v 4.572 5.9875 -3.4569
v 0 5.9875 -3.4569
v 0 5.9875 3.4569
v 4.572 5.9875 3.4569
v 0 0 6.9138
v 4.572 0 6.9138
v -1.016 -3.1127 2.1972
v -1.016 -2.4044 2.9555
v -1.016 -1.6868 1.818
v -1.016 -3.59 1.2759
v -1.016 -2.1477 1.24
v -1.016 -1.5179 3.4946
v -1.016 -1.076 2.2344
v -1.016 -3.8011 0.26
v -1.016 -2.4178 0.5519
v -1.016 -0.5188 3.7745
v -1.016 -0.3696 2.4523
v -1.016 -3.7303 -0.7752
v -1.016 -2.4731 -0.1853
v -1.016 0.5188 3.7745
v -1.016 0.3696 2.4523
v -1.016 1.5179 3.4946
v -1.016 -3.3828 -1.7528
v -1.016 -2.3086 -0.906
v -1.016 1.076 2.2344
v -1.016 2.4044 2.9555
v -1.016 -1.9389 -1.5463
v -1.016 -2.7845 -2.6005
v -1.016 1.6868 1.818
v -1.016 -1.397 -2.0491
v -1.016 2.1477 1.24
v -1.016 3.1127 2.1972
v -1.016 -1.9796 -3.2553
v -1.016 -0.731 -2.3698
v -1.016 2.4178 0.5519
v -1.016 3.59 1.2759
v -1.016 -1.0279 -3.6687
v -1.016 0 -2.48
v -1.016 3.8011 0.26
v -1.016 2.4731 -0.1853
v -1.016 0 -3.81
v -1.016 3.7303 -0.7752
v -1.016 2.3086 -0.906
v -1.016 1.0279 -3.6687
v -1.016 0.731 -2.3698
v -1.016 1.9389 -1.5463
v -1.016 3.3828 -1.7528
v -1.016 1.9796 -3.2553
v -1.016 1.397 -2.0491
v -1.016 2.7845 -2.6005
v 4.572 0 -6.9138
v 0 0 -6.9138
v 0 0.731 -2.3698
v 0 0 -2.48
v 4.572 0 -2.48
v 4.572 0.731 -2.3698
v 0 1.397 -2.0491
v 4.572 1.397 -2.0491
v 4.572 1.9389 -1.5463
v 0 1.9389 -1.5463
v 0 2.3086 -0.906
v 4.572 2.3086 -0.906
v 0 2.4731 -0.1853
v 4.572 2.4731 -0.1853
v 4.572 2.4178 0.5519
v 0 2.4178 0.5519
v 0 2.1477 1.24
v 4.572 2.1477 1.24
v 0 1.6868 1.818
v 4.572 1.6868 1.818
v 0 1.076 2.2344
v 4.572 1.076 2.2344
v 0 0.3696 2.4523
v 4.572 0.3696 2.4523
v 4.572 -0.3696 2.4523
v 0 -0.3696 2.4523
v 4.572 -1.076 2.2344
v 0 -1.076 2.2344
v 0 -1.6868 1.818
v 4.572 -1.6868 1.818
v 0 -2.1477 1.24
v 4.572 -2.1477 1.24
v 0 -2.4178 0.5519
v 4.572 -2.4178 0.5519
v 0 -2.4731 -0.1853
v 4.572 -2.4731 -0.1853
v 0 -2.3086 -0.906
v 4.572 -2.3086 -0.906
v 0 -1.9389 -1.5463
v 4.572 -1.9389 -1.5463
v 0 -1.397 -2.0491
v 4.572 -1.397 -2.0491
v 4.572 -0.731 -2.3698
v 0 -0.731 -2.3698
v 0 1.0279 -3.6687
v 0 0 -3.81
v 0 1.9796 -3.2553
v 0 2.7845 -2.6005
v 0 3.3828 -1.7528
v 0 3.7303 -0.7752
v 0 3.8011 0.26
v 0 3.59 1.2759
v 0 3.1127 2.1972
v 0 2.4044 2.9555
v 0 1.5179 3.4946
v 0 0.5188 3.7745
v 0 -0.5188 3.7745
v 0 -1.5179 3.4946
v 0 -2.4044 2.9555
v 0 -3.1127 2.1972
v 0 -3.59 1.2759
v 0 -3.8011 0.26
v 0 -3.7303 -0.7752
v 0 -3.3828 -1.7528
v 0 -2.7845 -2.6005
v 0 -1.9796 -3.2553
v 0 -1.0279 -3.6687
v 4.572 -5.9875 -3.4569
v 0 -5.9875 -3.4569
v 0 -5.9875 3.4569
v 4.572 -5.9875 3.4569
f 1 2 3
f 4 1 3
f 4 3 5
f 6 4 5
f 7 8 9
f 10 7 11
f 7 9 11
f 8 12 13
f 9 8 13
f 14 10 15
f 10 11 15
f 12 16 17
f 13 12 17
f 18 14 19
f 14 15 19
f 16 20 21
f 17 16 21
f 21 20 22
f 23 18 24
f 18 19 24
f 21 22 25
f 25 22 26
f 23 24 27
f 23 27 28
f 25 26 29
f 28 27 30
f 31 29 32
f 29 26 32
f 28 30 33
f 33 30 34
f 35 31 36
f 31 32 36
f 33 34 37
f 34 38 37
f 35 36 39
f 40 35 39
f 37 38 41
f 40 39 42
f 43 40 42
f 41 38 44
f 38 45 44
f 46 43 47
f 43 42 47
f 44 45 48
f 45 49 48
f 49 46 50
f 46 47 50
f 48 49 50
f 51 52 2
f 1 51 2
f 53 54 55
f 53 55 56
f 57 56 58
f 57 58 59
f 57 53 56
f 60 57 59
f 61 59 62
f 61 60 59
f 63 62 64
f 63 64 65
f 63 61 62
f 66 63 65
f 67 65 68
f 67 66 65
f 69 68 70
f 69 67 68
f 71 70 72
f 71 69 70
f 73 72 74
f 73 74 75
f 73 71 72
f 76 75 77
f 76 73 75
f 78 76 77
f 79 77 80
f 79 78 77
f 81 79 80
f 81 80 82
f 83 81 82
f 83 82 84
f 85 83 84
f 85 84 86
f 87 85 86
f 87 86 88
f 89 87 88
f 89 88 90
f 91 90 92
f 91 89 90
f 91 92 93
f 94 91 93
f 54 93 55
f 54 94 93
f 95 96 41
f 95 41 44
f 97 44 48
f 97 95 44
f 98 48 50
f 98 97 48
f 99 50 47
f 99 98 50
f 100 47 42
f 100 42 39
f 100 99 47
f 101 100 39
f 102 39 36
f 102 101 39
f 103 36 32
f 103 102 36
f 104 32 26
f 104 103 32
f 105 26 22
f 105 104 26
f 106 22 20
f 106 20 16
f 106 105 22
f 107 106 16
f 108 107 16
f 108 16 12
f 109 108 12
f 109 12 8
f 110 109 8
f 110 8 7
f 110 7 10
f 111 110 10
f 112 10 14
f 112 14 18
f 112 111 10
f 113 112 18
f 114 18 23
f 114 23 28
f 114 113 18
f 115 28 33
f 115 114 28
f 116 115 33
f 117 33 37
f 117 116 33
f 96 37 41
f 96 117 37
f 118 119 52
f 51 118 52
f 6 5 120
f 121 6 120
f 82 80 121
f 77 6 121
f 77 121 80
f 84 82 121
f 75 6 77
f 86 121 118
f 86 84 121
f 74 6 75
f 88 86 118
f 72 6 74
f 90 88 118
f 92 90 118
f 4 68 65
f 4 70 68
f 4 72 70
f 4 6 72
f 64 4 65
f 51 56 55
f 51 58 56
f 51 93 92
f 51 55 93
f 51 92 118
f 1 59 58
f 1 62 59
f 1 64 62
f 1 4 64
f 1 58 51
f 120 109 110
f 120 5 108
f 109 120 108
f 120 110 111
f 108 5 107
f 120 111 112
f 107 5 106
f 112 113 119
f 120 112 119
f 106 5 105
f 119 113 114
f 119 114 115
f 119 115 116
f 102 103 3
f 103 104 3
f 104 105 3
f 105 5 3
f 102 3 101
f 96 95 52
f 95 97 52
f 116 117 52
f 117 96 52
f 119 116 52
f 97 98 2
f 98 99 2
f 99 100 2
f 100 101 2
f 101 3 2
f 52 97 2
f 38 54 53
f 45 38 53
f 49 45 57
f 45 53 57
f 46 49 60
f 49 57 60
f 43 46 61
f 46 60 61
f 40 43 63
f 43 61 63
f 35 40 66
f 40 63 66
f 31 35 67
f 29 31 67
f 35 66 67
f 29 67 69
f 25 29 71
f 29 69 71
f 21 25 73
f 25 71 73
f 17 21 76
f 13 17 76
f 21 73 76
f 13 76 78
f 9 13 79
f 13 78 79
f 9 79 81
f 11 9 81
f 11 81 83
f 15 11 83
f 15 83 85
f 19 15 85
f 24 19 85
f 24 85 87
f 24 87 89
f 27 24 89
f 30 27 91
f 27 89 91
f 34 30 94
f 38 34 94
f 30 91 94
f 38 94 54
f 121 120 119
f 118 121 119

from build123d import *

# Parameters (mm, degrees)
SKETCH1_R           = 2.48
BOSS_EXTRUDE1_DEPTH = 4.572
SKETCH2_R           = 3.81
SKETCH2_R_2         = 2.48
BOSS_EXTRUDE2_DEPTH = 1.016


with BuildPart() as part:
    # Sketch1 → Boss-Extrude1 (new body)
    with BuildSketch(Plane(origin=(0, 0, 0), x_dir=(0, 0, -1), z_dir=(1, 0, 0))):
        Polygon((3.456884737, -5.9875), (6.913769474, 0), (3.456884737, 5.9875), (-3.456884737, 5.9875), (-6.913769474, 0), (-3.456884737, -5.9875), align=None)
        Circle(SKETCH1_R, mode=Mode.SUBTRACT)
    extrude(amount=BOSS_EXTRUDE1_DEPTH)

    # Sketch2 → Boss-Extrude2 (add)
    with BuildSketch(Plane(origin=(0, 0, 0), x_dir=(0, 0, -1), z_dir=(1, 0, 0))):
        Circle(SKETCH2_R)
        Circle(SKETCH2_R_2, mode=Mode.SUBTRACT)
    extrude(amount=-BOSS_EXTRUDE2_DEPTH)


solid = part.part
